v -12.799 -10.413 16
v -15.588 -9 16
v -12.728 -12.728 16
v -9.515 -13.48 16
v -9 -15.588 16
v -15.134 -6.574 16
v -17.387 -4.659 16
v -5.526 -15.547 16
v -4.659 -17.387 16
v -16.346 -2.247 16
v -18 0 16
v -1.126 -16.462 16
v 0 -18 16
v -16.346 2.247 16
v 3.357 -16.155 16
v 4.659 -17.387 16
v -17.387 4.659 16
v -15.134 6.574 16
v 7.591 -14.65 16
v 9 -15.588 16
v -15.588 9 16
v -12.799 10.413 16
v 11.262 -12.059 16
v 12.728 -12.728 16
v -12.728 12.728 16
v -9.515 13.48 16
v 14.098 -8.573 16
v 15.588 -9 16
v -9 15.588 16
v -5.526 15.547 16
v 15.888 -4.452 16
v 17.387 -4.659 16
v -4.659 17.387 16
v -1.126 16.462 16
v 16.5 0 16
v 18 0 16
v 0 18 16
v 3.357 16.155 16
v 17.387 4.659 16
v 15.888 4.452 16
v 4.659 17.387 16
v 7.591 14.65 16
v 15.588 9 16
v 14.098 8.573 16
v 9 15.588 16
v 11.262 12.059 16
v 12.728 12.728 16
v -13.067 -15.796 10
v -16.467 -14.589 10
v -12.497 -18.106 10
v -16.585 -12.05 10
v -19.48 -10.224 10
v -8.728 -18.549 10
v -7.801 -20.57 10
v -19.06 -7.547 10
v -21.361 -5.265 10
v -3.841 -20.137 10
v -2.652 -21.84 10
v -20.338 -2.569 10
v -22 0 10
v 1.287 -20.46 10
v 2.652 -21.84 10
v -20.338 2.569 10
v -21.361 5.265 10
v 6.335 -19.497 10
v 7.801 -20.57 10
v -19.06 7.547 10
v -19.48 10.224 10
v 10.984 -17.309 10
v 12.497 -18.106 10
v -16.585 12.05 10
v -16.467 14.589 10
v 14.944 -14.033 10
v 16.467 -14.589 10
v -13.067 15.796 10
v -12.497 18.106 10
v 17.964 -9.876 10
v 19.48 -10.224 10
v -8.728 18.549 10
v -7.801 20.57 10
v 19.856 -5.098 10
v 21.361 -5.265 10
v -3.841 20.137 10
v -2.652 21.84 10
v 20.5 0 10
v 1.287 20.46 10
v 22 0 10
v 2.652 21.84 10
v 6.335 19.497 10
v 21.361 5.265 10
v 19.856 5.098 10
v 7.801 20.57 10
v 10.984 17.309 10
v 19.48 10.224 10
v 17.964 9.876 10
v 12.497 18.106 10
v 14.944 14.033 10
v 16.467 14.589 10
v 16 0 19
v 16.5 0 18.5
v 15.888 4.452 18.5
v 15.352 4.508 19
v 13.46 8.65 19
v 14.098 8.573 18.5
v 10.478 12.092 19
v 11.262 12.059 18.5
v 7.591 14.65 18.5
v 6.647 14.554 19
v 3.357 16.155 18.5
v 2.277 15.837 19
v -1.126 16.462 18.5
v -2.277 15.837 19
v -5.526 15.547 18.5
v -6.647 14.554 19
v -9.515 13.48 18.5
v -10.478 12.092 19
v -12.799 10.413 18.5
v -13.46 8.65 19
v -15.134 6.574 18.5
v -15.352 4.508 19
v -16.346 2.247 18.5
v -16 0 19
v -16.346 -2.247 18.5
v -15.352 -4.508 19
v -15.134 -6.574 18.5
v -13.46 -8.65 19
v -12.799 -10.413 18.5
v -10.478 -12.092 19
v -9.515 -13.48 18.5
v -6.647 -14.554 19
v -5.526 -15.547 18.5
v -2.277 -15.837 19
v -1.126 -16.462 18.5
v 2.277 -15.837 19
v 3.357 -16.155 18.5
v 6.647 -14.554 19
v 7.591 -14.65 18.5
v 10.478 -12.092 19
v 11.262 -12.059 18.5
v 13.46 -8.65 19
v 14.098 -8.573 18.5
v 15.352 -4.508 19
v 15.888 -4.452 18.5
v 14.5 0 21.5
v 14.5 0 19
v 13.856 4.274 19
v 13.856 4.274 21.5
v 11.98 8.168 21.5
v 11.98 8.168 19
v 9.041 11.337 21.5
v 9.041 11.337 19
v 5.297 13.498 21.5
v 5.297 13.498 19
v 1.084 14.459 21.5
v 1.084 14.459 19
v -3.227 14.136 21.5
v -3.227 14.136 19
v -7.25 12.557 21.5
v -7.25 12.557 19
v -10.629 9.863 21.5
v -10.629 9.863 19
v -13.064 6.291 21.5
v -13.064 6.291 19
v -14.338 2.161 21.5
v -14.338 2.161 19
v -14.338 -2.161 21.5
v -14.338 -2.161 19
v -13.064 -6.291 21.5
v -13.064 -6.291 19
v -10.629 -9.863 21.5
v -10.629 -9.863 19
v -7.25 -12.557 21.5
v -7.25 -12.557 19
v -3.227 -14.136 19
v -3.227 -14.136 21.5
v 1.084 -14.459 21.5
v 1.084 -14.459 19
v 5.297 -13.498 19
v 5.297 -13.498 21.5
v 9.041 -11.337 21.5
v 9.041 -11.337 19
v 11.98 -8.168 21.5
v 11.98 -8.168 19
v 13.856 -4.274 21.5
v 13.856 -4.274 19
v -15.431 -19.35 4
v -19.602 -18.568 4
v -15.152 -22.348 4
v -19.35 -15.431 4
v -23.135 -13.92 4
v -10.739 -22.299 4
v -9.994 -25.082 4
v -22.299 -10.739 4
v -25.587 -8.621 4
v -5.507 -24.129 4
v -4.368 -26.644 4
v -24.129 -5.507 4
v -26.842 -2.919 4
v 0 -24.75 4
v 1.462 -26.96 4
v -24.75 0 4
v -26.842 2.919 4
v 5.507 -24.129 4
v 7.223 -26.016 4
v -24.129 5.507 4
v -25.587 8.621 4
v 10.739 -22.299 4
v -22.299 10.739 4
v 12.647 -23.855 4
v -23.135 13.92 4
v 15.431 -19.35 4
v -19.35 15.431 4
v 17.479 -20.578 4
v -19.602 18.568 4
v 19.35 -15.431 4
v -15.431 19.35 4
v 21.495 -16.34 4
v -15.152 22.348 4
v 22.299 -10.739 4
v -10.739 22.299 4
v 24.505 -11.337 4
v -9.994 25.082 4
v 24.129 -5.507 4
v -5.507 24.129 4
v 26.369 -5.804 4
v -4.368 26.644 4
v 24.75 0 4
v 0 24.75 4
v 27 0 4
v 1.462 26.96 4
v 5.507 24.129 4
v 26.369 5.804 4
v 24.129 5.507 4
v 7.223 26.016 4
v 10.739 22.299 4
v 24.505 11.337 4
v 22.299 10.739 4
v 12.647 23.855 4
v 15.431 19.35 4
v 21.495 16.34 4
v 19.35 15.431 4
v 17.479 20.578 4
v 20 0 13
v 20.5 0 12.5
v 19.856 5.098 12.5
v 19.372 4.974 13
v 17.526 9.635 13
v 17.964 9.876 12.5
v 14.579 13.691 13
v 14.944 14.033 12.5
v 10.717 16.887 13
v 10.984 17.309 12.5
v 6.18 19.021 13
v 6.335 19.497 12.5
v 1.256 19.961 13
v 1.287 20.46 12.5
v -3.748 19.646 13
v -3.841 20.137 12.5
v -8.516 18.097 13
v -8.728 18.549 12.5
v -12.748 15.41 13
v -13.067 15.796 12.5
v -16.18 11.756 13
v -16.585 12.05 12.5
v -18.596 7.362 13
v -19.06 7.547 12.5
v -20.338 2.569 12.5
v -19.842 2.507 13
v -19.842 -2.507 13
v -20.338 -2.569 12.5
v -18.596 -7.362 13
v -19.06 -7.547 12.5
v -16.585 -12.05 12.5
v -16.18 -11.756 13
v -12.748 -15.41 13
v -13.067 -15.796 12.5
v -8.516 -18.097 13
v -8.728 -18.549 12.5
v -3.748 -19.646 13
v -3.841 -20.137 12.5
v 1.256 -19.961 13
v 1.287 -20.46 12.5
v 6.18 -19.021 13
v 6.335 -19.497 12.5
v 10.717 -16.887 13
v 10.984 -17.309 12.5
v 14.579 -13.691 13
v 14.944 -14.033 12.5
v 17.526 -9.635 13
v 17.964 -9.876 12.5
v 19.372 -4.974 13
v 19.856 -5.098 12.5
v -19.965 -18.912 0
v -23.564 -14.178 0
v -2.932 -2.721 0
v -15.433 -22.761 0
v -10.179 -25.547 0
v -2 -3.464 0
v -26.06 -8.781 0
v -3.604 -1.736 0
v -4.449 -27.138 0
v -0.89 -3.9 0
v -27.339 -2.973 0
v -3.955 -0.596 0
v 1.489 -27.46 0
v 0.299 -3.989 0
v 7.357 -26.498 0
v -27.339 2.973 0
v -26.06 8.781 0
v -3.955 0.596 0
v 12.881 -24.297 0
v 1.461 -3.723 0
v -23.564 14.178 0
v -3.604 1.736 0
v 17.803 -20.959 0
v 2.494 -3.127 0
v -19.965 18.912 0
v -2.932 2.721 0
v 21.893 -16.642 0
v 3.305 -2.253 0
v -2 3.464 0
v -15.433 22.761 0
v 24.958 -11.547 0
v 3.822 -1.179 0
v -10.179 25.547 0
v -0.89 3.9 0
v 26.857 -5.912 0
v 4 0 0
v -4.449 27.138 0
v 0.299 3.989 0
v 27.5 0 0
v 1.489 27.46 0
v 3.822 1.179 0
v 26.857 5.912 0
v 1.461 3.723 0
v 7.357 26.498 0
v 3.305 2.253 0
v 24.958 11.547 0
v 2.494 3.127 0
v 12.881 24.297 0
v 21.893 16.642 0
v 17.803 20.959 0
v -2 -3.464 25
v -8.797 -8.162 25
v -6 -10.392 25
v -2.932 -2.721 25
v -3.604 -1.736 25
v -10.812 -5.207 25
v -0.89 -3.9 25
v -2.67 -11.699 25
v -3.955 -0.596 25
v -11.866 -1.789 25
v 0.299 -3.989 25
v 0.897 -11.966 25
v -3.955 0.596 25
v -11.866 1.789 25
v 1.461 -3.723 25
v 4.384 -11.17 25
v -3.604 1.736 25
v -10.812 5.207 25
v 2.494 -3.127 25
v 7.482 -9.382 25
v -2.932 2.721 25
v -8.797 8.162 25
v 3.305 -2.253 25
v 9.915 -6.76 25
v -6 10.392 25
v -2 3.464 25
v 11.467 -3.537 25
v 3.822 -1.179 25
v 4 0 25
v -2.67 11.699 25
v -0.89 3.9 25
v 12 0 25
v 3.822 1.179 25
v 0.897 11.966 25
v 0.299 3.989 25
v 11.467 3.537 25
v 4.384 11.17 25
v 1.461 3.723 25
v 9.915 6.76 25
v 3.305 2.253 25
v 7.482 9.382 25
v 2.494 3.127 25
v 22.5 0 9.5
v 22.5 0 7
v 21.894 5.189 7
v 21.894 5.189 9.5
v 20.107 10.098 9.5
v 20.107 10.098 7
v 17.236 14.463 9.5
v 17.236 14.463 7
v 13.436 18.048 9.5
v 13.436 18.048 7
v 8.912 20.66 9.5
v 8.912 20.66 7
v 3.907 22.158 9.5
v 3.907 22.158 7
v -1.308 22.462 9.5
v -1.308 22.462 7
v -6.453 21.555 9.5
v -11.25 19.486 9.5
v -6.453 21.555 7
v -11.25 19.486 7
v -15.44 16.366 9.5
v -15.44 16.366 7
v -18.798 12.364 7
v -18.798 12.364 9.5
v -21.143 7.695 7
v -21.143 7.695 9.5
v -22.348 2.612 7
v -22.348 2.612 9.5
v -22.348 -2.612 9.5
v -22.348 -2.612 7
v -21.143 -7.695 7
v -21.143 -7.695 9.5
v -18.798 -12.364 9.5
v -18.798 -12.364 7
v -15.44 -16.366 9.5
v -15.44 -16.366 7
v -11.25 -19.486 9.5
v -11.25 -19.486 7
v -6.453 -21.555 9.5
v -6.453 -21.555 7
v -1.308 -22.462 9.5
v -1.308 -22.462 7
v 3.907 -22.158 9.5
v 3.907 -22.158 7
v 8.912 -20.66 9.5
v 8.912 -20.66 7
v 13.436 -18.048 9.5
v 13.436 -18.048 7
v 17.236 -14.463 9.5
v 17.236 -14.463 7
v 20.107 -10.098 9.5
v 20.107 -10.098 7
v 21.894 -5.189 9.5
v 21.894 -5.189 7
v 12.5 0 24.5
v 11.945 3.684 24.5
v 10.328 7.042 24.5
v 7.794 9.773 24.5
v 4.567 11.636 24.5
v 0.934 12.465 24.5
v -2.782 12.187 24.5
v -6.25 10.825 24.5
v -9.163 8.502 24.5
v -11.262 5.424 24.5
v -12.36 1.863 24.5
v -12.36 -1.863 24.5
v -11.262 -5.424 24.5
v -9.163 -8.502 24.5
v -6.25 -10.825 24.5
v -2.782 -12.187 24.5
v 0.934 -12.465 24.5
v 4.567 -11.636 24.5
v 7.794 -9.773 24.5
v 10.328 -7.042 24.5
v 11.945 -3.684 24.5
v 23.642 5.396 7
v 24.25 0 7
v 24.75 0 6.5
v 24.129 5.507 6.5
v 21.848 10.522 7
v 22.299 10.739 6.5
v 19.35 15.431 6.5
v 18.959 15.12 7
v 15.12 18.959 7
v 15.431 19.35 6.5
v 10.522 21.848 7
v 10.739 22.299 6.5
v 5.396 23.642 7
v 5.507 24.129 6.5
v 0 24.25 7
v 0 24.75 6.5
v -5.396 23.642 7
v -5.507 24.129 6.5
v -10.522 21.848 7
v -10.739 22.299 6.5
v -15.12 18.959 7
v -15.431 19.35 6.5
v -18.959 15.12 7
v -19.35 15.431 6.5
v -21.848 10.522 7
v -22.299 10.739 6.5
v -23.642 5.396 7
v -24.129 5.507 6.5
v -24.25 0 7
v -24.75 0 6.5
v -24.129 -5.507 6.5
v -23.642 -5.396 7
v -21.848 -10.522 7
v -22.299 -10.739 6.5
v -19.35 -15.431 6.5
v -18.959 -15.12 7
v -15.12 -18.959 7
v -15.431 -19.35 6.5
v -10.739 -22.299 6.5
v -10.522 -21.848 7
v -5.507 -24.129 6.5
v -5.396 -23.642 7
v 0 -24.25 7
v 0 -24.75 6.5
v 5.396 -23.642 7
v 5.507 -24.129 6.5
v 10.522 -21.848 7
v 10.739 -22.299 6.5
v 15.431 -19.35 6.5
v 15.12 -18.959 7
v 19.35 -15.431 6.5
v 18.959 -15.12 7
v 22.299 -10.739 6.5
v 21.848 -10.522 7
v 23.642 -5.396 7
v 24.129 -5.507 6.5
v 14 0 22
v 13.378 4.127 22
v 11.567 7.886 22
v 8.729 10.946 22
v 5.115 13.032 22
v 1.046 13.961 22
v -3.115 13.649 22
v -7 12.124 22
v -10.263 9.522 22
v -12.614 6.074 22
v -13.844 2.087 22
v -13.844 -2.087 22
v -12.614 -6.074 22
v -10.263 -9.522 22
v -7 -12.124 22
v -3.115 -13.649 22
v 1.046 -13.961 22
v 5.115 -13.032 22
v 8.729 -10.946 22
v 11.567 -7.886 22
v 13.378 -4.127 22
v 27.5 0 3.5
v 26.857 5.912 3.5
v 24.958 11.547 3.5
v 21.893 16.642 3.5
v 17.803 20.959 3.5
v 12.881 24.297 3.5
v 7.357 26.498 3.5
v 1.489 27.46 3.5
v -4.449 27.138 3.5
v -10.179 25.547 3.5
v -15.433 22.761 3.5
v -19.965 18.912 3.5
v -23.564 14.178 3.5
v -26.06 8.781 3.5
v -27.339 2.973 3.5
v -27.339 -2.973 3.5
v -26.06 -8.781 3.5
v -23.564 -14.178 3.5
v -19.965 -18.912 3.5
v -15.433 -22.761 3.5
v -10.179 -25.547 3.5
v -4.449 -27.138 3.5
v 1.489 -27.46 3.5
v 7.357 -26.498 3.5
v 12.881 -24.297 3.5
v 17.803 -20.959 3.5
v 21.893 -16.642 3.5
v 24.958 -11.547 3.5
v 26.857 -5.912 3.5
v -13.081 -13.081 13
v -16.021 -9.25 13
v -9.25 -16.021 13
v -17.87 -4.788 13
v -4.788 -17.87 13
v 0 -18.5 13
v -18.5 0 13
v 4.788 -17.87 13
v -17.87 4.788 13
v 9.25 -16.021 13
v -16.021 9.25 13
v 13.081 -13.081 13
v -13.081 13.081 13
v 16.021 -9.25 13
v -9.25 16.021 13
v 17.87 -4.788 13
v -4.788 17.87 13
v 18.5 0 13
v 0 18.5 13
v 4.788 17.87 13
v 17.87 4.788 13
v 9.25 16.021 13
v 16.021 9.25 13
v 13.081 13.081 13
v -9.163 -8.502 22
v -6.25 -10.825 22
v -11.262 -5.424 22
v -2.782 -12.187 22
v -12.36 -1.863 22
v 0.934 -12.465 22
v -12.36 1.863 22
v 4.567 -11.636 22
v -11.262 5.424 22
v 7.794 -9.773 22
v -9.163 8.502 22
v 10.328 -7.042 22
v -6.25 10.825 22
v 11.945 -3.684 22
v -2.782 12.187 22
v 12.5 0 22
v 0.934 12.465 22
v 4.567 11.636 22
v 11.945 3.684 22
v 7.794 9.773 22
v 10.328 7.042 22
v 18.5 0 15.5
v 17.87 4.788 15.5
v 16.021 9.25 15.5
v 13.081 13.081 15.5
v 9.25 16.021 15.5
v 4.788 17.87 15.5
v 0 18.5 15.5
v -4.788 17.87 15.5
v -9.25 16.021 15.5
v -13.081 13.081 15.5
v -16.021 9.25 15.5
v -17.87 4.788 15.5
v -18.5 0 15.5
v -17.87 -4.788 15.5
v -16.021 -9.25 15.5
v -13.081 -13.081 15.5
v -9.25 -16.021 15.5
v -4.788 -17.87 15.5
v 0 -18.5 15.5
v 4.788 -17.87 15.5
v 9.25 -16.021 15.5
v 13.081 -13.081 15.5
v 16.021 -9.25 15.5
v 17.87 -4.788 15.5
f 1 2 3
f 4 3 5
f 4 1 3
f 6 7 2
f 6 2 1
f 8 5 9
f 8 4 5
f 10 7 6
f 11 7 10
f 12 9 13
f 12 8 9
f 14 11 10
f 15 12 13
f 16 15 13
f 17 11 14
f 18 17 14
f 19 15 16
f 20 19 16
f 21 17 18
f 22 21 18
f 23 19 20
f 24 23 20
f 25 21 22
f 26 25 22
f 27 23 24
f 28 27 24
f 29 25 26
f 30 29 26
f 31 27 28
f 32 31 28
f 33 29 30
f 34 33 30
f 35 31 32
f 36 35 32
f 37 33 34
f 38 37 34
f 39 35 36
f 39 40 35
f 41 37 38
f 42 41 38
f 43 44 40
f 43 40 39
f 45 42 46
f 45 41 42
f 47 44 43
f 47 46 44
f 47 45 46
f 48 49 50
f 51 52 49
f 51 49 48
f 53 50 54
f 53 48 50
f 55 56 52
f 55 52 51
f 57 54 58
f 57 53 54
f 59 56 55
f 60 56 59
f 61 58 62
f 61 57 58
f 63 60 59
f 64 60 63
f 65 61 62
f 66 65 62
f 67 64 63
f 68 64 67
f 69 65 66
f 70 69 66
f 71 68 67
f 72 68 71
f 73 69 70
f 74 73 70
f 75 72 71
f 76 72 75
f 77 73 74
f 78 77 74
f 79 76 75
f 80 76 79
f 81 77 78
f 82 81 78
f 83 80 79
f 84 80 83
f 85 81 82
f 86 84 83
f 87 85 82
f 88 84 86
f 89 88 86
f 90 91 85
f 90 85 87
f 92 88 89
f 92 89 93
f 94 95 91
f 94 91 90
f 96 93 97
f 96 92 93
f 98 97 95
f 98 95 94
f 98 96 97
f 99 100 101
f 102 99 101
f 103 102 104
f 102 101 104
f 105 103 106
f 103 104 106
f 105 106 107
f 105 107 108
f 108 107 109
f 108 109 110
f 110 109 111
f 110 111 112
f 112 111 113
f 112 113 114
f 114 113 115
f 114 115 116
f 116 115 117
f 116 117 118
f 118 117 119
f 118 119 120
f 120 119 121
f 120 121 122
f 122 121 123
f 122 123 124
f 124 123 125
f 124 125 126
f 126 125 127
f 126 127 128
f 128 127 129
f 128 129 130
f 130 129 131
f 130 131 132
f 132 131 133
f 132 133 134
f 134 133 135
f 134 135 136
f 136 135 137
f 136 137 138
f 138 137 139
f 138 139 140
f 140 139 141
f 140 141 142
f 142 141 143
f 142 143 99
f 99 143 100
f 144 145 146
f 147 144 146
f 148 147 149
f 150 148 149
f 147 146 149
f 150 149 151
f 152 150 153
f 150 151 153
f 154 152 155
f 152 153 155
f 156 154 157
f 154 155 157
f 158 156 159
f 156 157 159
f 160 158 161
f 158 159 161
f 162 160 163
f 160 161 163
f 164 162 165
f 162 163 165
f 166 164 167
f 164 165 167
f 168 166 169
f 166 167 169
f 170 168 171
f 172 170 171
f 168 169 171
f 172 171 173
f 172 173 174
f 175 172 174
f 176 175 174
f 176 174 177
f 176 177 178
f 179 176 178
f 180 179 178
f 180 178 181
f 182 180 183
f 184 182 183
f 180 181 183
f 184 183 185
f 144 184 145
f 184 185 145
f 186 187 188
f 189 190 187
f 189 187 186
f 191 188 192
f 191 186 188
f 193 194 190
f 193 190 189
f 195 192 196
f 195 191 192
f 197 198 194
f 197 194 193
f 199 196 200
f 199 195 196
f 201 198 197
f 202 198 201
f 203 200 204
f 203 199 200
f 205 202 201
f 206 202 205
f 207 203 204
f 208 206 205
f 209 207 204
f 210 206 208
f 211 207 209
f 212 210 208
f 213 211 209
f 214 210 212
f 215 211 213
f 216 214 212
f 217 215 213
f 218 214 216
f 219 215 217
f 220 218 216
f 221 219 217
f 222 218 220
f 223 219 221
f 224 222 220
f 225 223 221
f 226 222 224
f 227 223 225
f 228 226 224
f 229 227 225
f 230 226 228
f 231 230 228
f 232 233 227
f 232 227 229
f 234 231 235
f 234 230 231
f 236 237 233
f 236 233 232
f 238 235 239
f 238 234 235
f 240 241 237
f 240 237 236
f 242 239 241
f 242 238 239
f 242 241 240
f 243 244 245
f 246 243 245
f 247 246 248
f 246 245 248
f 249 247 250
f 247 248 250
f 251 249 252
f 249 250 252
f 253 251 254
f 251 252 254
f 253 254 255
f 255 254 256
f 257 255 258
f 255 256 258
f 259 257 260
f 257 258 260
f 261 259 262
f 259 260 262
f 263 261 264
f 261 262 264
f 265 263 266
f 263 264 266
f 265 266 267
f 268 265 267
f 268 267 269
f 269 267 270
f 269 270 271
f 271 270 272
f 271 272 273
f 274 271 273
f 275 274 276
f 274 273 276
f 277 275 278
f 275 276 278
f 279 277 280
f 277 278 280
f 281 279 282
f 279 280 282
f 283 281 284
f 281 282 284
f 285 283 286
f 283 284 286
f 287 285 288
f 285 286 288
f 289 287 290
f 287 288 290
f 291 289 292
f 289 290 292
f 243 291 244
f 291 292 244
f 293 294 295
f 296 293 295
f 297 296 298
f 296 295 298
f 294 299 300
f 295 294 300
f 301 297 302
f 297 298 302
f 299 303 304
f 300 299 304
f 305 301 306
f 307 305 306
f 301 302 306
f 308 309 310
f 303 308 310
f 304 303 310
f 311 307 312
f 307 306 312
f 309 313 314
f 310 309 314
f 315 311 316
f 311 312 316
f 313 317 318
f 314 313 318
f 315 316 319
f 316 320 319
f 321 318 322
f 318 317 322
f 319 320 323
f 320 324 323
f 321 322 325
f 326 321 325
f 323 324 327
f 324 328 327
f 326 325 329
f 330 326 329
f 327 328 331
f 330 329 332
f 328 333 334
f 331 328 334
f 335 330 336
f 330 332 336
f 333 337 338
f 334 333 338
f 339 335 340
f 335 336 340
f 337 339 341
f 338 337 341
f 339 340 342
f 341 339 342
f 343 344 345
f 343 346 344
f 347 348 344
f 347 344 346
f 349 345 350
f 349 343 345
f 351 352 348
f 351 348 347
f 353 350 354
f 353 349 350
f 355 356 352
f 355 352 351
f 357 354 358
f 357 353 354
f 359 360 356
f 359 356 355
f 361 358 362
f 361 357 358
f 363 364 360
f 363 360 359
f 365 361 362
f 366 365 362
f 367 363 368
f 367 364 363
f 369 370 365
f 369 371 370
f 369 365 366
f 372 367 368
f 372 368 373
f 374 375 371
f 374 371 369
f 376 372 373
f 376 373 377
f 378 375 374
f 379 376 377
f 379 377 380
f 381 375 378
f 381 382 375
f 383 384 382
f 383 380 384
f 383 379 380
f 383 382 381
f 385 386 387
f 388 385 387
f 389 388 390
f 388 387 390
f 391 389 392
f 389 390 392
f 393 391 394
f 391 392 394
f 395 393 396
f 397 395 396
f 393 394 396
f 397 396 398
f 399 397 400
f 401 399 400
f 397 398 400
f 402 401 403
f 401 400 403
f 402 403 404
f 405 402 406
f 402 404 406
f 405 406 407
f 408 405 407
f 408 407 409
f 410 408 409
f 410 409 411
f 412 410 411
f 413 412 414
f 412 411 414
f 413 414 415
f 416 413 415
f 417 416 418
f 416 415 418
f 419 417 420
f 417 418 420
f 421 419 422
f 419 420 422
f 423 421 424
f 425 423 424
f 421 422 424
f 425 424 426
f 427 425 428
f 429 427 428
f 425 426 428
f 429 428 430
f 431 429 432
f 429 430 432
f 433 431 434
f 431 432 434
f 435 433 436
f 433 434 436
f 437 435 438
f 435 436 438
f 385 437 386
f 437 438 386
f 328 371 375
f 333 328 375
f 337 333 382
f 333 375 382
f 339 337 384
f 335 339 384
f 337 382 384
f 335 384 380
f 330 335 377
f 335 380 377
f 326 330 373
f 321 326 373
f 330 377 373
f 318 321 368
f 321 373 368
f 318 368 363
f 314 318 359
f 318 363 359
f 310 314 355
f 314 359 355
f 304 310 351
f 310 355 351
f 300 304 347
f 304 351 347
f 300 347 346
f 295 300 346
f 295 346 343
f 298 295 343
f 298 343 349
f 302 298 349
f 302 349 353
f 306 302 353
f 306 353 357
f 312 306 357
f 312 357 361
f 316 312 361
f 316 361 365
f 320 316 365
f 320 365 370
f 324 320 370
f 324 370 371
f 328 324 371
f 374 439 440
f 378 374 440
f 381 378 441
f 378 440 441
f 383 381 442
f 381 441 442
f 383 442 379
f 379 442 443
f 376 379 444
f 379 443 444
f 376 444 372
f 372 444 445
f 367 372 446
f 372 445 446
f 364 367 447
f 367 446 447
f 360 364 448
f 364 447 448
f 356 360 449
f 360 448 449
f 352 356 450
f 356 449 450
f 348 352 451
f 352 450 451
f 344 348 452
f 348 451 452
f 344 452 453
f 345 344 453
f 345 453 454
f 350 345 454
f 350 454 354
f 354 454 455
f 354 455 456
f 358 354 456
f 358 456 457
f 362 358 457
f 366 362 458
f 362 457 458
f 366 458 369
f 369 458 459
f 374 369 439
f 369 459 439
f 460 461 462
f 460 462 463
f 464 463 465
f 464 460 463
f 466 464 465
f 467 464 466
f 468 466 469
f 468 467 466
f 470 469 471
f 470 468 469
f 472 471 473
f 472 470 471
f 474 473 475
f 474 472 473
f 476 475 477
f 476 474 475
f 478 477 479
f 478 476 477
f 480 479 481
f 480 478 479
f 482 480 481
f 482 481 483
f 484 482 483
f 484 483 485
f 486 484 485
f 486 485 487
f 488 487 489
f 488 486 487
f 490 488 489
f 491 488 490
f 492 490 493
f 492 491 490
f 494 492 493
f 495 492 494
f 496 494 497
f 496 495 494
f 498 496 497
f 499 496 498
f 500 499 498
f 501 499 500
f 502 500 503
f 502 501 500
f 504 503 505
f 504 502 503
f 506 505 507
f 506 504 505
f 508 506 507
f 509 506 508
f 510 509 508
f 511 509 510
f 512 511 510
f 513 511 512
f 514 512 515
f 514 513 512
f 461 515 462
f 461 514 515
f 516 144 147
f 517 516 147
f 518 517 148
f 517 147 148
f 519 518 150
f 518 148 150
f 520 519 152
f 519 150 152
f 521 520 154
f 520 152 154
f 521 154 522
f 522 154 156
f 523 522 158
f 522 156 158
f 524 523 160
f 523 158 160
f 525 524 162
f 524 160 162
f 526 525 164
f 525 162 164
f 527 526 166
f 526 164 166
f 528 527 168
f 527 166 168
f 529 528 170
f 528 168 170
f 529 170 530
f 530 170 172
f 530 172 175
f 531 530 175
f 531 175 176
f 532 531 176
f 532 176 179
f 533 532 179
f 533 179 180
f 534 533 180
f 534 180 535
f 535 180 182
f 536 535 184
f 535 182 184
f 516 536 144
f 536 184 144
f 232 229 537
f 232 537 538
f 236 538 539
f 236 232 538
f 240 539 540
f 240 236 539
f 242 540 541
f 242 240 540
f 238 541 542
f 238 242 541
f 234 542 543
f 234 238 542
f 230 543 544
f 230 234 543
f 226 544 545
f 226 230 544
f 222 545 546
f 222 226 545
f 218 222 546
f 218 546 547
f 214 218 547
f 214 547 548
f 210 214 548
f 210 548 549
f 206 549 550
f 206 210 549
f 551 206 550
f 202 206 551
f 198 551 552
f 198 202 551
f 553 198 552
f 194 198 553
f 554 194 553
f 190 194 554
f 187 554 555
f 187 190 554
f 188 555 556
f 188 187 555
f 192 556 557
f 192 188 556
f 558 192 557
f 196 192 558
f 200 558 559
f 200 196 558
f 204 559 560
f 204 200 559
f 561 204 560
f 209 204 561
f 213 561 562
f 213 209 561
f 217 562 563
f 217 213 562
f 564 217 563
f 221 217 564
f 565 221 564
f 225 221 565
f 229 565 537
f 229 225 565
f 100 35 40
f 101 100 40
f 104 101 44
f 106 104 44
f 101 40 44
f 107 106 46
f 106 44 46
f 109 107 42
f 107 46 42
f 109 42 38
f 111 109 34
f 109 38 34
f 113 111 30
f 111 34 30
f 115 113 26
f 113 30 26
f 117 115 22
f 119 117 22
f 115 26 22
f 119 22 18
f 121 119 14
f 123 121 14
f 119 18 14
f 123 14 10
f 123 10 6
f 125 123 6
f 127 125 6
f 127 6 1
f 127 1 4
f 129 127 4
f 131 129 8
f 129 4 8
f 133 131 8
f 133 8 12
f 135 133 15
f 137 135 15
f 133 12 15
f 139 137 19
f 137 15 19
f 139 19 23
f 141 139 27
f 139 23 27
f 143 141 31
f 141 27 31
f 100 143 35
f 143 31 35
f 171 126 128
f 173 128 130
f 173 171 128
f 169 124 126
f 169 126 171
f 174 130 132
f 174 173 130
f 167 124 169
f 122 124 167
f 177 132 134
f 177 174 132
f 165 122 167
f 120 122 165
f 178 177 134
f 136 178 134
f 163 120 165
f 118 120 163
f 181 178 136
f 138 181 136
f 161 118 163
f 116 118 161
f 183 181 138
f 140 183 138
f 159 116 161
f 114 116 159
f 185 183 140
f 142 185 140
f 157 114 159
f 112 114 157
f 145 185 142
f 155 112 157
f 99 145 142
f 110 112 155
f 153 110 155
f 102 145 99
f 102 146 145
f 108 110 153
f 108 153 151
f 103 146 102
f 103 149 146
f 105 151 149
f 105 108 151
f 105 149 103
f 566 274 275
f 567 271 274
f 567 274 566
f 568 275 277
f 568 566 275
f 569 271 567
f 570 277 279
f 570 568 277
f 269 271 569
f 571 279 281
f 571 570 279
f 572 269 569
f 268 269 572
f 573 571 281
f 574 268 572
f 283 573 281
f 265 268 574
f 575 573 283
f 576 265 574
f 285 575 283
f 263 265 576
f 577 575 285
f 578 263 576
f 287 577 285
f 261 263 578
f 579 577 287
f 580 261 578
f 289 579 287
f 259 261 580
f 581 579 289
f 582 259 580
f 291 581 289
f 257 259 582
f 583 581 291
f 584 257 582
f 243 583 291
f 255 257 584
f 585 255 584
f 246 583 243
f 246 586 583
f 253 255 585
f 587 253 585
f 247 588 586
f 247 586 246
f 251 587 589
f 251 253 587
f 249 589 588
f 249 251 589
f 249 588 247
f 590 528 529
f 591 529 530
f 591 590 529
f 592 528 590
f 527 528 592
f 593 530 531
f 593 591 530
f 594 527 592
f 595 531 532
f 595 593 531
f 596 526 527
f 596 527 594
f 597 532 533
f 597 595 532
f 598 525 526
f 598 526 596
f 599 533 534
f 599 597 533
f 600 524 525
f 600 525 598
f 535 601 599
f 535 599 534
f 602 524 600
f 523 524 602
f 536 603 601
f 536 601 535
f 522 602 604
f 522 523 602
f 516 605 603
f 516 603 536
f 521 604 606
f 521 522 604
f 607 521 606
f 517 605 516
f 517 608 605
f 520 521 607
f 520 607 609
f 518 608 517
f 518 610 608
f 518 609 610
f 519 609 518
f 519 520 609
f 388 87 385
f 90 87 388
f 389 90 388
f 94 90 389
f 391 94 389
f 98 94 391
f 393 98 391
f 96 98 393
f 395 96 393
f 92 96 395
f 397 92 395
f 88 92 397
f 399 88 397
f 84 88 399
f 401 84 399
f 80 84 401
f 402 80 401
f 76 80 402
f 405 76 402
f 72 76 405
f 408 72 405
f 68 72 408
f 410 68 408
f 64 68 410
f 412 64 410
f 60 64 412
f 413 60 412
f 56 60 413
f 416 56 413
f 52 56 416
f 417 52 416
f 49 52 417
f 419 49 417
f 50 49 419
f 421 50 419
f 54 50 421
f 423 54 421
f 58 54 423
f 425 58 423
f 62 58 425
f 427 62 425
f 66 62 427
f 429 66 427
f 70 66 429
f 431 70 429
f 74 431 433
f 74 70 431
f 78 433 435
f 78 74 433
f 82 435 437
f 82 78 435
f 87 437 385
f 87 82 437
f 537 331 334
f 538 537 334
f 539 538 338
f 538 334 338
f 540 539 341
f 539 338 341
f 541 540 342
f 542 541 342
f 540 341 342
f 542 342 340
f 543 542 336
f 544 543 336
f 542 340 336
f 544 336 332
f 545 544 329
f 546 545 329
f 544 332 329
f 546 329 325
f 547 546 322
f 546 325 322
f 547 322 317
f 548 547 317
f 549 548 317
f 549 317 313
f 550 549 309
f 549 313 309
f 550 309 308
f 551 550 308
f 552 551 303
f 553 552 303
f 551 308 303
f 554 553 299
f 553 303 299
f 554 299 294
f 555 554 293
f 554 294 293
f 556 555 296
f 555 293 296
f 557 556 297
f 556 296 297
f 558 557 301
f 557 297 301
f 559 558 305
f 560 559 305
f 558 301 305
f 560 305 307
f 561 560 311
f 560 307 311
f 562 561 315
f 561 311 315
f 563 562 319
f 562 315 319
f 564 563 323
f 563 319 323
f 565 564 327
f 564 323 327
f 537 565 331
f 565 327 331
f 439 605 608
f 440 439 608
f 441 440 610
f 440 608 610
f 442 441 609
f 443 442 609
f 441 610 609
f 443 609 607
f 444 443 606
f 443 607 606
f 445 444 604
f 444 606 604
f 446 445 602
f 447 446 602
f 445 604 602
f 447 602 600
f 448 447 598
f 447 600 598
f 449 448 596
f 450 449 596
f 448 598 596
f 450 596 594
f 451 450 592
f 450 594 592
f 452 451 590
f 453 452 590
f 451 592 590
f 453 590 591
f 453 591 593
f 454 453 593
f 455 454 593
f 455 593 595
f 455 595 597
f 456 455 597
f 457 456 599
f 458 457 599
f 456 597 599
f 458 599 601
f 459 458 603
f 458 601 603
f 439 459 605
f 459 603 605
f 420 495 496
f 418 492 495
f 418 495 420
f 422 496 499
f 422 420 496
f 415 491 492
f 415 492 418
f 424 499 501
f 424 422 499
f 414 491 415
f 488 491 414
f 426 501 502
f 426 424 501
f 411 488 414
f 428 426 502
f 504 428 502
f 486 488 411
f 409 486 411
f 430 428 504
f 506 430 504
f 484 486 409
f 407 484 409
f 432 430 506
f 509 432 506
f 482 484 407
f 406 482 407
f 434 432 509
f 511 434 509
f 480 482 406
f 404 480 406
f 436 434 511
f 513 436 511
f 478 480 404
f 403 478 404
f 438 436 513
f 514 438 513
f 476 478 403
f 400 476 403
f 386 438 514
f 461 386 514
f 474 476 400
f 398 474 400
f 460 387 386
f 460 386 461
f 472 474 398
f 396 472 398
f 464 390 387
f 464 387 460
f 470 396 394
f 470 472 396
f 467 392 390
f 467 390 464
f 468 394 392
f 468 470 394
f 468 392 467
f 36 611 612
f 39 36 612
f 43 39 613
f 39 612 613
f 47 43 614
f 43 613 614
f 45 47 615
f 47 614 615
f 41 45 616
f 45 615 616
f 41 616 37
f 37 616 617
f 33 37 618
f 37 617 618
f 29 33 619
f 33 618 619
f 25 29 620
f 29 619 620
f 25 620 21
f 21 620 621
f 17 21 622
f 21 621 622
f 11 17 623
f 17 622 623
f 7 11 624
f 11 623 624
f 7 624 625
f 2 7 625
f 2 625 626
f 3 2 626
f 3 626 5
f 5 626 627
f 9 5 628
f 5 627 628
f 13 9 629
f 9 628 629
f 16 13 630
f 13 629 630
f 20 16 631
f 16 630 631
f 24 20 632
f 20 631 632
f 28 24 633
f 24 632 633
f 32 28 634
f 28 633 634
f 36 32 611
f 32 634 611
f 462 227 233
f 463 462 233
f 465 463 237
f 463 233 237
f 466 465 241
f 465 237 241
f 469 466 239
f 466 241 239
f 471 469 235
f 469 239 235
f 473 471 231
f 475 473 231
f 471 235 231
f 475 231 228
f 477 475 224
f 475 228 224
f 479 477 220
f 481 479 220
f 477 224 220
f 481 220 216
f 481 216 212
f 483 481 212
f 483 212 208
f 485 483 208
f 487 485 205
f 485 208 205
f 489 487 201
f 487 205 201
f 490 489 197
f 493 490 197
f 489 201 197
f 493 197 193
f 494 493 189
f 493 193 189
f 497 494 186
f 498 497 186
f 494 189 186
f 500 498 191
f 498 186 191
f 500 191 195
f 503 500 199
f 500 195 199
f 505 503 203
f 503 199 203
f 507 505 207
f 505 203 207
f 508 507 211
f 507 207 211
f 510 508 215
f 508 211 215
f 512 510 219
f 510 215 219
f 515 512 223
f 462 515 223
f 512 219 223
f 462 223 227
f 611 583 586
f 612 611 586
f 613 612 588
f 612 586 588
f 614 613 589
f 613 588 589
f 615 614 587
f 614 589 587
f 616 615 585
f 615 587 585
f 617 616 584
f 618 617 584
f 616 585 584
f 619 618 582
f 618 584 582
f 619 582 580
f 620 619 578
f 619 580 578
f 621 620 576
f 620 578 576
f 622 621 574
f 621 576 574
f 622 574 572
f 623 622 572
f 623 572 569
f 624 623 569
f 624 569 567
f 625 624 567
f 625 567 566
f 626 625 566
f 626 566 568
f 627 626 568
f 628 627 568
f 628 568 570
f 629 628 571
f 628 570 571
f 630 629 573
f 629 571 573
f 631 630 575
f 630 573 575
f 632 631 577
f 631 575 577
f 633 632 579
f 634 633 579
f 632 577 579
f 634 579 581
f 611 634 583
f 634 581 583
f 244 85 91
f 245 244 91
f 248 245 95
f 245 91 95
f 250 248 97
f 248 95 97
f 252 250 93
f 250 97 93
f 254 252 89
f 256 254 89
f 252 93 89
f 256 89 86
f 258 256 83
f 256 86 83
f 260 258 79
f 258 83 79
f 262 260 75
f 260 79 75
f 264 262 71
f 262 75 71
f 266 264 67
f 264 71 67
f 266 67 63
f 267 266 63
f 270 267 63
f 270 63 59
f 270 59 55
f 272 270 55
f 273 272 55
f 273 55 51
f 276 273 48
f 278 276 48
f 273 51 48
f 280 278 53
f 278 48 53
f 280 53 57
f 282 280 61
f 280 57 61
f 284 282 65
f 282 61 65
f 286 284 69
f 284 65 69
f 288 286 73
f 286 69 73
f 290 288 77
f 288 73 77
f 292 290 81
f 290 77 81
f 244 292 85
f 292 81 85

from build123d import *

# Parameters (mm, degrees)
F0_R      = 27.5
F1_DEPTH  = 4
F2_R      = 24.75
F3_DEPTH  = 3
F4_R      = 22.5
F5_DEPTH  = 3
F6_R      = 20.5
F7_DEPTH  = 3
F8_R      = 18.5
F9_DEPTH  = 3
F10_R     = 16.5
F11_DEPTH = 3
F12_R     = 14.5
F13_DEPTH = 3
F14_R     = 12.5
F15_DEPTH = 3
F16_R     = 4
F17_DEPTH = 35
F18_SIZE  = 0.5
F19_SIZE  = 0.5


with BuildPart() as f1:
    # F0 (on Top) → F1 (new body)
    with BuildSketch(Plane.XY):
        Circle(F0_R)
    extrude(amount=F1_DEPTH)

    # F2 (on face) → F3 (join)
    with BuildSketch(Plane.XY.offset(4)):
        Circle(F2_R)
    extrude(amount=F3_DEPTH)

    # F4 (on face) → F5 (join)
    with BuildSketch(Plane.XY.offset(7)):
        Circle(F4_R)
    extrude(amount=F5_DEPTH)

    # F6 (on face) → F7 (join)
    with BuildSketch(Plane.XY.offset(10)):
        Circle(F6_R)
    extrude(amount=F7_DEPTH)

    # F8 (on face) → F9 (join)
    with BuildSketch(Plane.XY.offset(13)):
        Circle(F8_R)
    extrude(amount=F9_DEPTH)

    # F10 (on face) → F11 (join)
    with BuildSketch(Plane.XY.offset(16)):
        Circle(F10_R)
    extrude(amount=F11_DEPTH)

    # F12 (on face) → F13 (join)
    with BuildSketch(Plane.XY.offset(19)):
        Circle(F12_R)
    extrude(amount=F13_DEPTH)

    # F14 (on face) → F15 (join)
    with BuildSketch(Plane.XY.offset(22)):
        Circle(F14_R)
    extrude(amount=F15_DEPTH)

    # F16 (on face) → F17 (cut)
    with BuildSketch(Plane.XY.offset(25)):
        Circle(F16_R)
    extrude(amount=-F17_DEPTH, mode=Mode.SUBTRACT)

    # F18
    f18_edges = [f1.edges().sort_by_distance(p)[0] for p in [
        (-12.5, 0, 25),
    ]]
    chamfer(f18_edges, length=F18_SIZE)

    # F19
    f19_edges = [f1.edges().sort_by_distance(p)[0] for p in [
        (-14.5, 0, 22),
        (-16.5, 0, 19),
        (-18.5, 0, 16),
        (-20.5, 0, 13),
        (-22.5, 0, 10),
        (-24.75, 0, 7),
        (-27.5, 0, 4),
    ]]
    chamfer(f19_edges, length=F19_SIZE)


solid = f1.part
